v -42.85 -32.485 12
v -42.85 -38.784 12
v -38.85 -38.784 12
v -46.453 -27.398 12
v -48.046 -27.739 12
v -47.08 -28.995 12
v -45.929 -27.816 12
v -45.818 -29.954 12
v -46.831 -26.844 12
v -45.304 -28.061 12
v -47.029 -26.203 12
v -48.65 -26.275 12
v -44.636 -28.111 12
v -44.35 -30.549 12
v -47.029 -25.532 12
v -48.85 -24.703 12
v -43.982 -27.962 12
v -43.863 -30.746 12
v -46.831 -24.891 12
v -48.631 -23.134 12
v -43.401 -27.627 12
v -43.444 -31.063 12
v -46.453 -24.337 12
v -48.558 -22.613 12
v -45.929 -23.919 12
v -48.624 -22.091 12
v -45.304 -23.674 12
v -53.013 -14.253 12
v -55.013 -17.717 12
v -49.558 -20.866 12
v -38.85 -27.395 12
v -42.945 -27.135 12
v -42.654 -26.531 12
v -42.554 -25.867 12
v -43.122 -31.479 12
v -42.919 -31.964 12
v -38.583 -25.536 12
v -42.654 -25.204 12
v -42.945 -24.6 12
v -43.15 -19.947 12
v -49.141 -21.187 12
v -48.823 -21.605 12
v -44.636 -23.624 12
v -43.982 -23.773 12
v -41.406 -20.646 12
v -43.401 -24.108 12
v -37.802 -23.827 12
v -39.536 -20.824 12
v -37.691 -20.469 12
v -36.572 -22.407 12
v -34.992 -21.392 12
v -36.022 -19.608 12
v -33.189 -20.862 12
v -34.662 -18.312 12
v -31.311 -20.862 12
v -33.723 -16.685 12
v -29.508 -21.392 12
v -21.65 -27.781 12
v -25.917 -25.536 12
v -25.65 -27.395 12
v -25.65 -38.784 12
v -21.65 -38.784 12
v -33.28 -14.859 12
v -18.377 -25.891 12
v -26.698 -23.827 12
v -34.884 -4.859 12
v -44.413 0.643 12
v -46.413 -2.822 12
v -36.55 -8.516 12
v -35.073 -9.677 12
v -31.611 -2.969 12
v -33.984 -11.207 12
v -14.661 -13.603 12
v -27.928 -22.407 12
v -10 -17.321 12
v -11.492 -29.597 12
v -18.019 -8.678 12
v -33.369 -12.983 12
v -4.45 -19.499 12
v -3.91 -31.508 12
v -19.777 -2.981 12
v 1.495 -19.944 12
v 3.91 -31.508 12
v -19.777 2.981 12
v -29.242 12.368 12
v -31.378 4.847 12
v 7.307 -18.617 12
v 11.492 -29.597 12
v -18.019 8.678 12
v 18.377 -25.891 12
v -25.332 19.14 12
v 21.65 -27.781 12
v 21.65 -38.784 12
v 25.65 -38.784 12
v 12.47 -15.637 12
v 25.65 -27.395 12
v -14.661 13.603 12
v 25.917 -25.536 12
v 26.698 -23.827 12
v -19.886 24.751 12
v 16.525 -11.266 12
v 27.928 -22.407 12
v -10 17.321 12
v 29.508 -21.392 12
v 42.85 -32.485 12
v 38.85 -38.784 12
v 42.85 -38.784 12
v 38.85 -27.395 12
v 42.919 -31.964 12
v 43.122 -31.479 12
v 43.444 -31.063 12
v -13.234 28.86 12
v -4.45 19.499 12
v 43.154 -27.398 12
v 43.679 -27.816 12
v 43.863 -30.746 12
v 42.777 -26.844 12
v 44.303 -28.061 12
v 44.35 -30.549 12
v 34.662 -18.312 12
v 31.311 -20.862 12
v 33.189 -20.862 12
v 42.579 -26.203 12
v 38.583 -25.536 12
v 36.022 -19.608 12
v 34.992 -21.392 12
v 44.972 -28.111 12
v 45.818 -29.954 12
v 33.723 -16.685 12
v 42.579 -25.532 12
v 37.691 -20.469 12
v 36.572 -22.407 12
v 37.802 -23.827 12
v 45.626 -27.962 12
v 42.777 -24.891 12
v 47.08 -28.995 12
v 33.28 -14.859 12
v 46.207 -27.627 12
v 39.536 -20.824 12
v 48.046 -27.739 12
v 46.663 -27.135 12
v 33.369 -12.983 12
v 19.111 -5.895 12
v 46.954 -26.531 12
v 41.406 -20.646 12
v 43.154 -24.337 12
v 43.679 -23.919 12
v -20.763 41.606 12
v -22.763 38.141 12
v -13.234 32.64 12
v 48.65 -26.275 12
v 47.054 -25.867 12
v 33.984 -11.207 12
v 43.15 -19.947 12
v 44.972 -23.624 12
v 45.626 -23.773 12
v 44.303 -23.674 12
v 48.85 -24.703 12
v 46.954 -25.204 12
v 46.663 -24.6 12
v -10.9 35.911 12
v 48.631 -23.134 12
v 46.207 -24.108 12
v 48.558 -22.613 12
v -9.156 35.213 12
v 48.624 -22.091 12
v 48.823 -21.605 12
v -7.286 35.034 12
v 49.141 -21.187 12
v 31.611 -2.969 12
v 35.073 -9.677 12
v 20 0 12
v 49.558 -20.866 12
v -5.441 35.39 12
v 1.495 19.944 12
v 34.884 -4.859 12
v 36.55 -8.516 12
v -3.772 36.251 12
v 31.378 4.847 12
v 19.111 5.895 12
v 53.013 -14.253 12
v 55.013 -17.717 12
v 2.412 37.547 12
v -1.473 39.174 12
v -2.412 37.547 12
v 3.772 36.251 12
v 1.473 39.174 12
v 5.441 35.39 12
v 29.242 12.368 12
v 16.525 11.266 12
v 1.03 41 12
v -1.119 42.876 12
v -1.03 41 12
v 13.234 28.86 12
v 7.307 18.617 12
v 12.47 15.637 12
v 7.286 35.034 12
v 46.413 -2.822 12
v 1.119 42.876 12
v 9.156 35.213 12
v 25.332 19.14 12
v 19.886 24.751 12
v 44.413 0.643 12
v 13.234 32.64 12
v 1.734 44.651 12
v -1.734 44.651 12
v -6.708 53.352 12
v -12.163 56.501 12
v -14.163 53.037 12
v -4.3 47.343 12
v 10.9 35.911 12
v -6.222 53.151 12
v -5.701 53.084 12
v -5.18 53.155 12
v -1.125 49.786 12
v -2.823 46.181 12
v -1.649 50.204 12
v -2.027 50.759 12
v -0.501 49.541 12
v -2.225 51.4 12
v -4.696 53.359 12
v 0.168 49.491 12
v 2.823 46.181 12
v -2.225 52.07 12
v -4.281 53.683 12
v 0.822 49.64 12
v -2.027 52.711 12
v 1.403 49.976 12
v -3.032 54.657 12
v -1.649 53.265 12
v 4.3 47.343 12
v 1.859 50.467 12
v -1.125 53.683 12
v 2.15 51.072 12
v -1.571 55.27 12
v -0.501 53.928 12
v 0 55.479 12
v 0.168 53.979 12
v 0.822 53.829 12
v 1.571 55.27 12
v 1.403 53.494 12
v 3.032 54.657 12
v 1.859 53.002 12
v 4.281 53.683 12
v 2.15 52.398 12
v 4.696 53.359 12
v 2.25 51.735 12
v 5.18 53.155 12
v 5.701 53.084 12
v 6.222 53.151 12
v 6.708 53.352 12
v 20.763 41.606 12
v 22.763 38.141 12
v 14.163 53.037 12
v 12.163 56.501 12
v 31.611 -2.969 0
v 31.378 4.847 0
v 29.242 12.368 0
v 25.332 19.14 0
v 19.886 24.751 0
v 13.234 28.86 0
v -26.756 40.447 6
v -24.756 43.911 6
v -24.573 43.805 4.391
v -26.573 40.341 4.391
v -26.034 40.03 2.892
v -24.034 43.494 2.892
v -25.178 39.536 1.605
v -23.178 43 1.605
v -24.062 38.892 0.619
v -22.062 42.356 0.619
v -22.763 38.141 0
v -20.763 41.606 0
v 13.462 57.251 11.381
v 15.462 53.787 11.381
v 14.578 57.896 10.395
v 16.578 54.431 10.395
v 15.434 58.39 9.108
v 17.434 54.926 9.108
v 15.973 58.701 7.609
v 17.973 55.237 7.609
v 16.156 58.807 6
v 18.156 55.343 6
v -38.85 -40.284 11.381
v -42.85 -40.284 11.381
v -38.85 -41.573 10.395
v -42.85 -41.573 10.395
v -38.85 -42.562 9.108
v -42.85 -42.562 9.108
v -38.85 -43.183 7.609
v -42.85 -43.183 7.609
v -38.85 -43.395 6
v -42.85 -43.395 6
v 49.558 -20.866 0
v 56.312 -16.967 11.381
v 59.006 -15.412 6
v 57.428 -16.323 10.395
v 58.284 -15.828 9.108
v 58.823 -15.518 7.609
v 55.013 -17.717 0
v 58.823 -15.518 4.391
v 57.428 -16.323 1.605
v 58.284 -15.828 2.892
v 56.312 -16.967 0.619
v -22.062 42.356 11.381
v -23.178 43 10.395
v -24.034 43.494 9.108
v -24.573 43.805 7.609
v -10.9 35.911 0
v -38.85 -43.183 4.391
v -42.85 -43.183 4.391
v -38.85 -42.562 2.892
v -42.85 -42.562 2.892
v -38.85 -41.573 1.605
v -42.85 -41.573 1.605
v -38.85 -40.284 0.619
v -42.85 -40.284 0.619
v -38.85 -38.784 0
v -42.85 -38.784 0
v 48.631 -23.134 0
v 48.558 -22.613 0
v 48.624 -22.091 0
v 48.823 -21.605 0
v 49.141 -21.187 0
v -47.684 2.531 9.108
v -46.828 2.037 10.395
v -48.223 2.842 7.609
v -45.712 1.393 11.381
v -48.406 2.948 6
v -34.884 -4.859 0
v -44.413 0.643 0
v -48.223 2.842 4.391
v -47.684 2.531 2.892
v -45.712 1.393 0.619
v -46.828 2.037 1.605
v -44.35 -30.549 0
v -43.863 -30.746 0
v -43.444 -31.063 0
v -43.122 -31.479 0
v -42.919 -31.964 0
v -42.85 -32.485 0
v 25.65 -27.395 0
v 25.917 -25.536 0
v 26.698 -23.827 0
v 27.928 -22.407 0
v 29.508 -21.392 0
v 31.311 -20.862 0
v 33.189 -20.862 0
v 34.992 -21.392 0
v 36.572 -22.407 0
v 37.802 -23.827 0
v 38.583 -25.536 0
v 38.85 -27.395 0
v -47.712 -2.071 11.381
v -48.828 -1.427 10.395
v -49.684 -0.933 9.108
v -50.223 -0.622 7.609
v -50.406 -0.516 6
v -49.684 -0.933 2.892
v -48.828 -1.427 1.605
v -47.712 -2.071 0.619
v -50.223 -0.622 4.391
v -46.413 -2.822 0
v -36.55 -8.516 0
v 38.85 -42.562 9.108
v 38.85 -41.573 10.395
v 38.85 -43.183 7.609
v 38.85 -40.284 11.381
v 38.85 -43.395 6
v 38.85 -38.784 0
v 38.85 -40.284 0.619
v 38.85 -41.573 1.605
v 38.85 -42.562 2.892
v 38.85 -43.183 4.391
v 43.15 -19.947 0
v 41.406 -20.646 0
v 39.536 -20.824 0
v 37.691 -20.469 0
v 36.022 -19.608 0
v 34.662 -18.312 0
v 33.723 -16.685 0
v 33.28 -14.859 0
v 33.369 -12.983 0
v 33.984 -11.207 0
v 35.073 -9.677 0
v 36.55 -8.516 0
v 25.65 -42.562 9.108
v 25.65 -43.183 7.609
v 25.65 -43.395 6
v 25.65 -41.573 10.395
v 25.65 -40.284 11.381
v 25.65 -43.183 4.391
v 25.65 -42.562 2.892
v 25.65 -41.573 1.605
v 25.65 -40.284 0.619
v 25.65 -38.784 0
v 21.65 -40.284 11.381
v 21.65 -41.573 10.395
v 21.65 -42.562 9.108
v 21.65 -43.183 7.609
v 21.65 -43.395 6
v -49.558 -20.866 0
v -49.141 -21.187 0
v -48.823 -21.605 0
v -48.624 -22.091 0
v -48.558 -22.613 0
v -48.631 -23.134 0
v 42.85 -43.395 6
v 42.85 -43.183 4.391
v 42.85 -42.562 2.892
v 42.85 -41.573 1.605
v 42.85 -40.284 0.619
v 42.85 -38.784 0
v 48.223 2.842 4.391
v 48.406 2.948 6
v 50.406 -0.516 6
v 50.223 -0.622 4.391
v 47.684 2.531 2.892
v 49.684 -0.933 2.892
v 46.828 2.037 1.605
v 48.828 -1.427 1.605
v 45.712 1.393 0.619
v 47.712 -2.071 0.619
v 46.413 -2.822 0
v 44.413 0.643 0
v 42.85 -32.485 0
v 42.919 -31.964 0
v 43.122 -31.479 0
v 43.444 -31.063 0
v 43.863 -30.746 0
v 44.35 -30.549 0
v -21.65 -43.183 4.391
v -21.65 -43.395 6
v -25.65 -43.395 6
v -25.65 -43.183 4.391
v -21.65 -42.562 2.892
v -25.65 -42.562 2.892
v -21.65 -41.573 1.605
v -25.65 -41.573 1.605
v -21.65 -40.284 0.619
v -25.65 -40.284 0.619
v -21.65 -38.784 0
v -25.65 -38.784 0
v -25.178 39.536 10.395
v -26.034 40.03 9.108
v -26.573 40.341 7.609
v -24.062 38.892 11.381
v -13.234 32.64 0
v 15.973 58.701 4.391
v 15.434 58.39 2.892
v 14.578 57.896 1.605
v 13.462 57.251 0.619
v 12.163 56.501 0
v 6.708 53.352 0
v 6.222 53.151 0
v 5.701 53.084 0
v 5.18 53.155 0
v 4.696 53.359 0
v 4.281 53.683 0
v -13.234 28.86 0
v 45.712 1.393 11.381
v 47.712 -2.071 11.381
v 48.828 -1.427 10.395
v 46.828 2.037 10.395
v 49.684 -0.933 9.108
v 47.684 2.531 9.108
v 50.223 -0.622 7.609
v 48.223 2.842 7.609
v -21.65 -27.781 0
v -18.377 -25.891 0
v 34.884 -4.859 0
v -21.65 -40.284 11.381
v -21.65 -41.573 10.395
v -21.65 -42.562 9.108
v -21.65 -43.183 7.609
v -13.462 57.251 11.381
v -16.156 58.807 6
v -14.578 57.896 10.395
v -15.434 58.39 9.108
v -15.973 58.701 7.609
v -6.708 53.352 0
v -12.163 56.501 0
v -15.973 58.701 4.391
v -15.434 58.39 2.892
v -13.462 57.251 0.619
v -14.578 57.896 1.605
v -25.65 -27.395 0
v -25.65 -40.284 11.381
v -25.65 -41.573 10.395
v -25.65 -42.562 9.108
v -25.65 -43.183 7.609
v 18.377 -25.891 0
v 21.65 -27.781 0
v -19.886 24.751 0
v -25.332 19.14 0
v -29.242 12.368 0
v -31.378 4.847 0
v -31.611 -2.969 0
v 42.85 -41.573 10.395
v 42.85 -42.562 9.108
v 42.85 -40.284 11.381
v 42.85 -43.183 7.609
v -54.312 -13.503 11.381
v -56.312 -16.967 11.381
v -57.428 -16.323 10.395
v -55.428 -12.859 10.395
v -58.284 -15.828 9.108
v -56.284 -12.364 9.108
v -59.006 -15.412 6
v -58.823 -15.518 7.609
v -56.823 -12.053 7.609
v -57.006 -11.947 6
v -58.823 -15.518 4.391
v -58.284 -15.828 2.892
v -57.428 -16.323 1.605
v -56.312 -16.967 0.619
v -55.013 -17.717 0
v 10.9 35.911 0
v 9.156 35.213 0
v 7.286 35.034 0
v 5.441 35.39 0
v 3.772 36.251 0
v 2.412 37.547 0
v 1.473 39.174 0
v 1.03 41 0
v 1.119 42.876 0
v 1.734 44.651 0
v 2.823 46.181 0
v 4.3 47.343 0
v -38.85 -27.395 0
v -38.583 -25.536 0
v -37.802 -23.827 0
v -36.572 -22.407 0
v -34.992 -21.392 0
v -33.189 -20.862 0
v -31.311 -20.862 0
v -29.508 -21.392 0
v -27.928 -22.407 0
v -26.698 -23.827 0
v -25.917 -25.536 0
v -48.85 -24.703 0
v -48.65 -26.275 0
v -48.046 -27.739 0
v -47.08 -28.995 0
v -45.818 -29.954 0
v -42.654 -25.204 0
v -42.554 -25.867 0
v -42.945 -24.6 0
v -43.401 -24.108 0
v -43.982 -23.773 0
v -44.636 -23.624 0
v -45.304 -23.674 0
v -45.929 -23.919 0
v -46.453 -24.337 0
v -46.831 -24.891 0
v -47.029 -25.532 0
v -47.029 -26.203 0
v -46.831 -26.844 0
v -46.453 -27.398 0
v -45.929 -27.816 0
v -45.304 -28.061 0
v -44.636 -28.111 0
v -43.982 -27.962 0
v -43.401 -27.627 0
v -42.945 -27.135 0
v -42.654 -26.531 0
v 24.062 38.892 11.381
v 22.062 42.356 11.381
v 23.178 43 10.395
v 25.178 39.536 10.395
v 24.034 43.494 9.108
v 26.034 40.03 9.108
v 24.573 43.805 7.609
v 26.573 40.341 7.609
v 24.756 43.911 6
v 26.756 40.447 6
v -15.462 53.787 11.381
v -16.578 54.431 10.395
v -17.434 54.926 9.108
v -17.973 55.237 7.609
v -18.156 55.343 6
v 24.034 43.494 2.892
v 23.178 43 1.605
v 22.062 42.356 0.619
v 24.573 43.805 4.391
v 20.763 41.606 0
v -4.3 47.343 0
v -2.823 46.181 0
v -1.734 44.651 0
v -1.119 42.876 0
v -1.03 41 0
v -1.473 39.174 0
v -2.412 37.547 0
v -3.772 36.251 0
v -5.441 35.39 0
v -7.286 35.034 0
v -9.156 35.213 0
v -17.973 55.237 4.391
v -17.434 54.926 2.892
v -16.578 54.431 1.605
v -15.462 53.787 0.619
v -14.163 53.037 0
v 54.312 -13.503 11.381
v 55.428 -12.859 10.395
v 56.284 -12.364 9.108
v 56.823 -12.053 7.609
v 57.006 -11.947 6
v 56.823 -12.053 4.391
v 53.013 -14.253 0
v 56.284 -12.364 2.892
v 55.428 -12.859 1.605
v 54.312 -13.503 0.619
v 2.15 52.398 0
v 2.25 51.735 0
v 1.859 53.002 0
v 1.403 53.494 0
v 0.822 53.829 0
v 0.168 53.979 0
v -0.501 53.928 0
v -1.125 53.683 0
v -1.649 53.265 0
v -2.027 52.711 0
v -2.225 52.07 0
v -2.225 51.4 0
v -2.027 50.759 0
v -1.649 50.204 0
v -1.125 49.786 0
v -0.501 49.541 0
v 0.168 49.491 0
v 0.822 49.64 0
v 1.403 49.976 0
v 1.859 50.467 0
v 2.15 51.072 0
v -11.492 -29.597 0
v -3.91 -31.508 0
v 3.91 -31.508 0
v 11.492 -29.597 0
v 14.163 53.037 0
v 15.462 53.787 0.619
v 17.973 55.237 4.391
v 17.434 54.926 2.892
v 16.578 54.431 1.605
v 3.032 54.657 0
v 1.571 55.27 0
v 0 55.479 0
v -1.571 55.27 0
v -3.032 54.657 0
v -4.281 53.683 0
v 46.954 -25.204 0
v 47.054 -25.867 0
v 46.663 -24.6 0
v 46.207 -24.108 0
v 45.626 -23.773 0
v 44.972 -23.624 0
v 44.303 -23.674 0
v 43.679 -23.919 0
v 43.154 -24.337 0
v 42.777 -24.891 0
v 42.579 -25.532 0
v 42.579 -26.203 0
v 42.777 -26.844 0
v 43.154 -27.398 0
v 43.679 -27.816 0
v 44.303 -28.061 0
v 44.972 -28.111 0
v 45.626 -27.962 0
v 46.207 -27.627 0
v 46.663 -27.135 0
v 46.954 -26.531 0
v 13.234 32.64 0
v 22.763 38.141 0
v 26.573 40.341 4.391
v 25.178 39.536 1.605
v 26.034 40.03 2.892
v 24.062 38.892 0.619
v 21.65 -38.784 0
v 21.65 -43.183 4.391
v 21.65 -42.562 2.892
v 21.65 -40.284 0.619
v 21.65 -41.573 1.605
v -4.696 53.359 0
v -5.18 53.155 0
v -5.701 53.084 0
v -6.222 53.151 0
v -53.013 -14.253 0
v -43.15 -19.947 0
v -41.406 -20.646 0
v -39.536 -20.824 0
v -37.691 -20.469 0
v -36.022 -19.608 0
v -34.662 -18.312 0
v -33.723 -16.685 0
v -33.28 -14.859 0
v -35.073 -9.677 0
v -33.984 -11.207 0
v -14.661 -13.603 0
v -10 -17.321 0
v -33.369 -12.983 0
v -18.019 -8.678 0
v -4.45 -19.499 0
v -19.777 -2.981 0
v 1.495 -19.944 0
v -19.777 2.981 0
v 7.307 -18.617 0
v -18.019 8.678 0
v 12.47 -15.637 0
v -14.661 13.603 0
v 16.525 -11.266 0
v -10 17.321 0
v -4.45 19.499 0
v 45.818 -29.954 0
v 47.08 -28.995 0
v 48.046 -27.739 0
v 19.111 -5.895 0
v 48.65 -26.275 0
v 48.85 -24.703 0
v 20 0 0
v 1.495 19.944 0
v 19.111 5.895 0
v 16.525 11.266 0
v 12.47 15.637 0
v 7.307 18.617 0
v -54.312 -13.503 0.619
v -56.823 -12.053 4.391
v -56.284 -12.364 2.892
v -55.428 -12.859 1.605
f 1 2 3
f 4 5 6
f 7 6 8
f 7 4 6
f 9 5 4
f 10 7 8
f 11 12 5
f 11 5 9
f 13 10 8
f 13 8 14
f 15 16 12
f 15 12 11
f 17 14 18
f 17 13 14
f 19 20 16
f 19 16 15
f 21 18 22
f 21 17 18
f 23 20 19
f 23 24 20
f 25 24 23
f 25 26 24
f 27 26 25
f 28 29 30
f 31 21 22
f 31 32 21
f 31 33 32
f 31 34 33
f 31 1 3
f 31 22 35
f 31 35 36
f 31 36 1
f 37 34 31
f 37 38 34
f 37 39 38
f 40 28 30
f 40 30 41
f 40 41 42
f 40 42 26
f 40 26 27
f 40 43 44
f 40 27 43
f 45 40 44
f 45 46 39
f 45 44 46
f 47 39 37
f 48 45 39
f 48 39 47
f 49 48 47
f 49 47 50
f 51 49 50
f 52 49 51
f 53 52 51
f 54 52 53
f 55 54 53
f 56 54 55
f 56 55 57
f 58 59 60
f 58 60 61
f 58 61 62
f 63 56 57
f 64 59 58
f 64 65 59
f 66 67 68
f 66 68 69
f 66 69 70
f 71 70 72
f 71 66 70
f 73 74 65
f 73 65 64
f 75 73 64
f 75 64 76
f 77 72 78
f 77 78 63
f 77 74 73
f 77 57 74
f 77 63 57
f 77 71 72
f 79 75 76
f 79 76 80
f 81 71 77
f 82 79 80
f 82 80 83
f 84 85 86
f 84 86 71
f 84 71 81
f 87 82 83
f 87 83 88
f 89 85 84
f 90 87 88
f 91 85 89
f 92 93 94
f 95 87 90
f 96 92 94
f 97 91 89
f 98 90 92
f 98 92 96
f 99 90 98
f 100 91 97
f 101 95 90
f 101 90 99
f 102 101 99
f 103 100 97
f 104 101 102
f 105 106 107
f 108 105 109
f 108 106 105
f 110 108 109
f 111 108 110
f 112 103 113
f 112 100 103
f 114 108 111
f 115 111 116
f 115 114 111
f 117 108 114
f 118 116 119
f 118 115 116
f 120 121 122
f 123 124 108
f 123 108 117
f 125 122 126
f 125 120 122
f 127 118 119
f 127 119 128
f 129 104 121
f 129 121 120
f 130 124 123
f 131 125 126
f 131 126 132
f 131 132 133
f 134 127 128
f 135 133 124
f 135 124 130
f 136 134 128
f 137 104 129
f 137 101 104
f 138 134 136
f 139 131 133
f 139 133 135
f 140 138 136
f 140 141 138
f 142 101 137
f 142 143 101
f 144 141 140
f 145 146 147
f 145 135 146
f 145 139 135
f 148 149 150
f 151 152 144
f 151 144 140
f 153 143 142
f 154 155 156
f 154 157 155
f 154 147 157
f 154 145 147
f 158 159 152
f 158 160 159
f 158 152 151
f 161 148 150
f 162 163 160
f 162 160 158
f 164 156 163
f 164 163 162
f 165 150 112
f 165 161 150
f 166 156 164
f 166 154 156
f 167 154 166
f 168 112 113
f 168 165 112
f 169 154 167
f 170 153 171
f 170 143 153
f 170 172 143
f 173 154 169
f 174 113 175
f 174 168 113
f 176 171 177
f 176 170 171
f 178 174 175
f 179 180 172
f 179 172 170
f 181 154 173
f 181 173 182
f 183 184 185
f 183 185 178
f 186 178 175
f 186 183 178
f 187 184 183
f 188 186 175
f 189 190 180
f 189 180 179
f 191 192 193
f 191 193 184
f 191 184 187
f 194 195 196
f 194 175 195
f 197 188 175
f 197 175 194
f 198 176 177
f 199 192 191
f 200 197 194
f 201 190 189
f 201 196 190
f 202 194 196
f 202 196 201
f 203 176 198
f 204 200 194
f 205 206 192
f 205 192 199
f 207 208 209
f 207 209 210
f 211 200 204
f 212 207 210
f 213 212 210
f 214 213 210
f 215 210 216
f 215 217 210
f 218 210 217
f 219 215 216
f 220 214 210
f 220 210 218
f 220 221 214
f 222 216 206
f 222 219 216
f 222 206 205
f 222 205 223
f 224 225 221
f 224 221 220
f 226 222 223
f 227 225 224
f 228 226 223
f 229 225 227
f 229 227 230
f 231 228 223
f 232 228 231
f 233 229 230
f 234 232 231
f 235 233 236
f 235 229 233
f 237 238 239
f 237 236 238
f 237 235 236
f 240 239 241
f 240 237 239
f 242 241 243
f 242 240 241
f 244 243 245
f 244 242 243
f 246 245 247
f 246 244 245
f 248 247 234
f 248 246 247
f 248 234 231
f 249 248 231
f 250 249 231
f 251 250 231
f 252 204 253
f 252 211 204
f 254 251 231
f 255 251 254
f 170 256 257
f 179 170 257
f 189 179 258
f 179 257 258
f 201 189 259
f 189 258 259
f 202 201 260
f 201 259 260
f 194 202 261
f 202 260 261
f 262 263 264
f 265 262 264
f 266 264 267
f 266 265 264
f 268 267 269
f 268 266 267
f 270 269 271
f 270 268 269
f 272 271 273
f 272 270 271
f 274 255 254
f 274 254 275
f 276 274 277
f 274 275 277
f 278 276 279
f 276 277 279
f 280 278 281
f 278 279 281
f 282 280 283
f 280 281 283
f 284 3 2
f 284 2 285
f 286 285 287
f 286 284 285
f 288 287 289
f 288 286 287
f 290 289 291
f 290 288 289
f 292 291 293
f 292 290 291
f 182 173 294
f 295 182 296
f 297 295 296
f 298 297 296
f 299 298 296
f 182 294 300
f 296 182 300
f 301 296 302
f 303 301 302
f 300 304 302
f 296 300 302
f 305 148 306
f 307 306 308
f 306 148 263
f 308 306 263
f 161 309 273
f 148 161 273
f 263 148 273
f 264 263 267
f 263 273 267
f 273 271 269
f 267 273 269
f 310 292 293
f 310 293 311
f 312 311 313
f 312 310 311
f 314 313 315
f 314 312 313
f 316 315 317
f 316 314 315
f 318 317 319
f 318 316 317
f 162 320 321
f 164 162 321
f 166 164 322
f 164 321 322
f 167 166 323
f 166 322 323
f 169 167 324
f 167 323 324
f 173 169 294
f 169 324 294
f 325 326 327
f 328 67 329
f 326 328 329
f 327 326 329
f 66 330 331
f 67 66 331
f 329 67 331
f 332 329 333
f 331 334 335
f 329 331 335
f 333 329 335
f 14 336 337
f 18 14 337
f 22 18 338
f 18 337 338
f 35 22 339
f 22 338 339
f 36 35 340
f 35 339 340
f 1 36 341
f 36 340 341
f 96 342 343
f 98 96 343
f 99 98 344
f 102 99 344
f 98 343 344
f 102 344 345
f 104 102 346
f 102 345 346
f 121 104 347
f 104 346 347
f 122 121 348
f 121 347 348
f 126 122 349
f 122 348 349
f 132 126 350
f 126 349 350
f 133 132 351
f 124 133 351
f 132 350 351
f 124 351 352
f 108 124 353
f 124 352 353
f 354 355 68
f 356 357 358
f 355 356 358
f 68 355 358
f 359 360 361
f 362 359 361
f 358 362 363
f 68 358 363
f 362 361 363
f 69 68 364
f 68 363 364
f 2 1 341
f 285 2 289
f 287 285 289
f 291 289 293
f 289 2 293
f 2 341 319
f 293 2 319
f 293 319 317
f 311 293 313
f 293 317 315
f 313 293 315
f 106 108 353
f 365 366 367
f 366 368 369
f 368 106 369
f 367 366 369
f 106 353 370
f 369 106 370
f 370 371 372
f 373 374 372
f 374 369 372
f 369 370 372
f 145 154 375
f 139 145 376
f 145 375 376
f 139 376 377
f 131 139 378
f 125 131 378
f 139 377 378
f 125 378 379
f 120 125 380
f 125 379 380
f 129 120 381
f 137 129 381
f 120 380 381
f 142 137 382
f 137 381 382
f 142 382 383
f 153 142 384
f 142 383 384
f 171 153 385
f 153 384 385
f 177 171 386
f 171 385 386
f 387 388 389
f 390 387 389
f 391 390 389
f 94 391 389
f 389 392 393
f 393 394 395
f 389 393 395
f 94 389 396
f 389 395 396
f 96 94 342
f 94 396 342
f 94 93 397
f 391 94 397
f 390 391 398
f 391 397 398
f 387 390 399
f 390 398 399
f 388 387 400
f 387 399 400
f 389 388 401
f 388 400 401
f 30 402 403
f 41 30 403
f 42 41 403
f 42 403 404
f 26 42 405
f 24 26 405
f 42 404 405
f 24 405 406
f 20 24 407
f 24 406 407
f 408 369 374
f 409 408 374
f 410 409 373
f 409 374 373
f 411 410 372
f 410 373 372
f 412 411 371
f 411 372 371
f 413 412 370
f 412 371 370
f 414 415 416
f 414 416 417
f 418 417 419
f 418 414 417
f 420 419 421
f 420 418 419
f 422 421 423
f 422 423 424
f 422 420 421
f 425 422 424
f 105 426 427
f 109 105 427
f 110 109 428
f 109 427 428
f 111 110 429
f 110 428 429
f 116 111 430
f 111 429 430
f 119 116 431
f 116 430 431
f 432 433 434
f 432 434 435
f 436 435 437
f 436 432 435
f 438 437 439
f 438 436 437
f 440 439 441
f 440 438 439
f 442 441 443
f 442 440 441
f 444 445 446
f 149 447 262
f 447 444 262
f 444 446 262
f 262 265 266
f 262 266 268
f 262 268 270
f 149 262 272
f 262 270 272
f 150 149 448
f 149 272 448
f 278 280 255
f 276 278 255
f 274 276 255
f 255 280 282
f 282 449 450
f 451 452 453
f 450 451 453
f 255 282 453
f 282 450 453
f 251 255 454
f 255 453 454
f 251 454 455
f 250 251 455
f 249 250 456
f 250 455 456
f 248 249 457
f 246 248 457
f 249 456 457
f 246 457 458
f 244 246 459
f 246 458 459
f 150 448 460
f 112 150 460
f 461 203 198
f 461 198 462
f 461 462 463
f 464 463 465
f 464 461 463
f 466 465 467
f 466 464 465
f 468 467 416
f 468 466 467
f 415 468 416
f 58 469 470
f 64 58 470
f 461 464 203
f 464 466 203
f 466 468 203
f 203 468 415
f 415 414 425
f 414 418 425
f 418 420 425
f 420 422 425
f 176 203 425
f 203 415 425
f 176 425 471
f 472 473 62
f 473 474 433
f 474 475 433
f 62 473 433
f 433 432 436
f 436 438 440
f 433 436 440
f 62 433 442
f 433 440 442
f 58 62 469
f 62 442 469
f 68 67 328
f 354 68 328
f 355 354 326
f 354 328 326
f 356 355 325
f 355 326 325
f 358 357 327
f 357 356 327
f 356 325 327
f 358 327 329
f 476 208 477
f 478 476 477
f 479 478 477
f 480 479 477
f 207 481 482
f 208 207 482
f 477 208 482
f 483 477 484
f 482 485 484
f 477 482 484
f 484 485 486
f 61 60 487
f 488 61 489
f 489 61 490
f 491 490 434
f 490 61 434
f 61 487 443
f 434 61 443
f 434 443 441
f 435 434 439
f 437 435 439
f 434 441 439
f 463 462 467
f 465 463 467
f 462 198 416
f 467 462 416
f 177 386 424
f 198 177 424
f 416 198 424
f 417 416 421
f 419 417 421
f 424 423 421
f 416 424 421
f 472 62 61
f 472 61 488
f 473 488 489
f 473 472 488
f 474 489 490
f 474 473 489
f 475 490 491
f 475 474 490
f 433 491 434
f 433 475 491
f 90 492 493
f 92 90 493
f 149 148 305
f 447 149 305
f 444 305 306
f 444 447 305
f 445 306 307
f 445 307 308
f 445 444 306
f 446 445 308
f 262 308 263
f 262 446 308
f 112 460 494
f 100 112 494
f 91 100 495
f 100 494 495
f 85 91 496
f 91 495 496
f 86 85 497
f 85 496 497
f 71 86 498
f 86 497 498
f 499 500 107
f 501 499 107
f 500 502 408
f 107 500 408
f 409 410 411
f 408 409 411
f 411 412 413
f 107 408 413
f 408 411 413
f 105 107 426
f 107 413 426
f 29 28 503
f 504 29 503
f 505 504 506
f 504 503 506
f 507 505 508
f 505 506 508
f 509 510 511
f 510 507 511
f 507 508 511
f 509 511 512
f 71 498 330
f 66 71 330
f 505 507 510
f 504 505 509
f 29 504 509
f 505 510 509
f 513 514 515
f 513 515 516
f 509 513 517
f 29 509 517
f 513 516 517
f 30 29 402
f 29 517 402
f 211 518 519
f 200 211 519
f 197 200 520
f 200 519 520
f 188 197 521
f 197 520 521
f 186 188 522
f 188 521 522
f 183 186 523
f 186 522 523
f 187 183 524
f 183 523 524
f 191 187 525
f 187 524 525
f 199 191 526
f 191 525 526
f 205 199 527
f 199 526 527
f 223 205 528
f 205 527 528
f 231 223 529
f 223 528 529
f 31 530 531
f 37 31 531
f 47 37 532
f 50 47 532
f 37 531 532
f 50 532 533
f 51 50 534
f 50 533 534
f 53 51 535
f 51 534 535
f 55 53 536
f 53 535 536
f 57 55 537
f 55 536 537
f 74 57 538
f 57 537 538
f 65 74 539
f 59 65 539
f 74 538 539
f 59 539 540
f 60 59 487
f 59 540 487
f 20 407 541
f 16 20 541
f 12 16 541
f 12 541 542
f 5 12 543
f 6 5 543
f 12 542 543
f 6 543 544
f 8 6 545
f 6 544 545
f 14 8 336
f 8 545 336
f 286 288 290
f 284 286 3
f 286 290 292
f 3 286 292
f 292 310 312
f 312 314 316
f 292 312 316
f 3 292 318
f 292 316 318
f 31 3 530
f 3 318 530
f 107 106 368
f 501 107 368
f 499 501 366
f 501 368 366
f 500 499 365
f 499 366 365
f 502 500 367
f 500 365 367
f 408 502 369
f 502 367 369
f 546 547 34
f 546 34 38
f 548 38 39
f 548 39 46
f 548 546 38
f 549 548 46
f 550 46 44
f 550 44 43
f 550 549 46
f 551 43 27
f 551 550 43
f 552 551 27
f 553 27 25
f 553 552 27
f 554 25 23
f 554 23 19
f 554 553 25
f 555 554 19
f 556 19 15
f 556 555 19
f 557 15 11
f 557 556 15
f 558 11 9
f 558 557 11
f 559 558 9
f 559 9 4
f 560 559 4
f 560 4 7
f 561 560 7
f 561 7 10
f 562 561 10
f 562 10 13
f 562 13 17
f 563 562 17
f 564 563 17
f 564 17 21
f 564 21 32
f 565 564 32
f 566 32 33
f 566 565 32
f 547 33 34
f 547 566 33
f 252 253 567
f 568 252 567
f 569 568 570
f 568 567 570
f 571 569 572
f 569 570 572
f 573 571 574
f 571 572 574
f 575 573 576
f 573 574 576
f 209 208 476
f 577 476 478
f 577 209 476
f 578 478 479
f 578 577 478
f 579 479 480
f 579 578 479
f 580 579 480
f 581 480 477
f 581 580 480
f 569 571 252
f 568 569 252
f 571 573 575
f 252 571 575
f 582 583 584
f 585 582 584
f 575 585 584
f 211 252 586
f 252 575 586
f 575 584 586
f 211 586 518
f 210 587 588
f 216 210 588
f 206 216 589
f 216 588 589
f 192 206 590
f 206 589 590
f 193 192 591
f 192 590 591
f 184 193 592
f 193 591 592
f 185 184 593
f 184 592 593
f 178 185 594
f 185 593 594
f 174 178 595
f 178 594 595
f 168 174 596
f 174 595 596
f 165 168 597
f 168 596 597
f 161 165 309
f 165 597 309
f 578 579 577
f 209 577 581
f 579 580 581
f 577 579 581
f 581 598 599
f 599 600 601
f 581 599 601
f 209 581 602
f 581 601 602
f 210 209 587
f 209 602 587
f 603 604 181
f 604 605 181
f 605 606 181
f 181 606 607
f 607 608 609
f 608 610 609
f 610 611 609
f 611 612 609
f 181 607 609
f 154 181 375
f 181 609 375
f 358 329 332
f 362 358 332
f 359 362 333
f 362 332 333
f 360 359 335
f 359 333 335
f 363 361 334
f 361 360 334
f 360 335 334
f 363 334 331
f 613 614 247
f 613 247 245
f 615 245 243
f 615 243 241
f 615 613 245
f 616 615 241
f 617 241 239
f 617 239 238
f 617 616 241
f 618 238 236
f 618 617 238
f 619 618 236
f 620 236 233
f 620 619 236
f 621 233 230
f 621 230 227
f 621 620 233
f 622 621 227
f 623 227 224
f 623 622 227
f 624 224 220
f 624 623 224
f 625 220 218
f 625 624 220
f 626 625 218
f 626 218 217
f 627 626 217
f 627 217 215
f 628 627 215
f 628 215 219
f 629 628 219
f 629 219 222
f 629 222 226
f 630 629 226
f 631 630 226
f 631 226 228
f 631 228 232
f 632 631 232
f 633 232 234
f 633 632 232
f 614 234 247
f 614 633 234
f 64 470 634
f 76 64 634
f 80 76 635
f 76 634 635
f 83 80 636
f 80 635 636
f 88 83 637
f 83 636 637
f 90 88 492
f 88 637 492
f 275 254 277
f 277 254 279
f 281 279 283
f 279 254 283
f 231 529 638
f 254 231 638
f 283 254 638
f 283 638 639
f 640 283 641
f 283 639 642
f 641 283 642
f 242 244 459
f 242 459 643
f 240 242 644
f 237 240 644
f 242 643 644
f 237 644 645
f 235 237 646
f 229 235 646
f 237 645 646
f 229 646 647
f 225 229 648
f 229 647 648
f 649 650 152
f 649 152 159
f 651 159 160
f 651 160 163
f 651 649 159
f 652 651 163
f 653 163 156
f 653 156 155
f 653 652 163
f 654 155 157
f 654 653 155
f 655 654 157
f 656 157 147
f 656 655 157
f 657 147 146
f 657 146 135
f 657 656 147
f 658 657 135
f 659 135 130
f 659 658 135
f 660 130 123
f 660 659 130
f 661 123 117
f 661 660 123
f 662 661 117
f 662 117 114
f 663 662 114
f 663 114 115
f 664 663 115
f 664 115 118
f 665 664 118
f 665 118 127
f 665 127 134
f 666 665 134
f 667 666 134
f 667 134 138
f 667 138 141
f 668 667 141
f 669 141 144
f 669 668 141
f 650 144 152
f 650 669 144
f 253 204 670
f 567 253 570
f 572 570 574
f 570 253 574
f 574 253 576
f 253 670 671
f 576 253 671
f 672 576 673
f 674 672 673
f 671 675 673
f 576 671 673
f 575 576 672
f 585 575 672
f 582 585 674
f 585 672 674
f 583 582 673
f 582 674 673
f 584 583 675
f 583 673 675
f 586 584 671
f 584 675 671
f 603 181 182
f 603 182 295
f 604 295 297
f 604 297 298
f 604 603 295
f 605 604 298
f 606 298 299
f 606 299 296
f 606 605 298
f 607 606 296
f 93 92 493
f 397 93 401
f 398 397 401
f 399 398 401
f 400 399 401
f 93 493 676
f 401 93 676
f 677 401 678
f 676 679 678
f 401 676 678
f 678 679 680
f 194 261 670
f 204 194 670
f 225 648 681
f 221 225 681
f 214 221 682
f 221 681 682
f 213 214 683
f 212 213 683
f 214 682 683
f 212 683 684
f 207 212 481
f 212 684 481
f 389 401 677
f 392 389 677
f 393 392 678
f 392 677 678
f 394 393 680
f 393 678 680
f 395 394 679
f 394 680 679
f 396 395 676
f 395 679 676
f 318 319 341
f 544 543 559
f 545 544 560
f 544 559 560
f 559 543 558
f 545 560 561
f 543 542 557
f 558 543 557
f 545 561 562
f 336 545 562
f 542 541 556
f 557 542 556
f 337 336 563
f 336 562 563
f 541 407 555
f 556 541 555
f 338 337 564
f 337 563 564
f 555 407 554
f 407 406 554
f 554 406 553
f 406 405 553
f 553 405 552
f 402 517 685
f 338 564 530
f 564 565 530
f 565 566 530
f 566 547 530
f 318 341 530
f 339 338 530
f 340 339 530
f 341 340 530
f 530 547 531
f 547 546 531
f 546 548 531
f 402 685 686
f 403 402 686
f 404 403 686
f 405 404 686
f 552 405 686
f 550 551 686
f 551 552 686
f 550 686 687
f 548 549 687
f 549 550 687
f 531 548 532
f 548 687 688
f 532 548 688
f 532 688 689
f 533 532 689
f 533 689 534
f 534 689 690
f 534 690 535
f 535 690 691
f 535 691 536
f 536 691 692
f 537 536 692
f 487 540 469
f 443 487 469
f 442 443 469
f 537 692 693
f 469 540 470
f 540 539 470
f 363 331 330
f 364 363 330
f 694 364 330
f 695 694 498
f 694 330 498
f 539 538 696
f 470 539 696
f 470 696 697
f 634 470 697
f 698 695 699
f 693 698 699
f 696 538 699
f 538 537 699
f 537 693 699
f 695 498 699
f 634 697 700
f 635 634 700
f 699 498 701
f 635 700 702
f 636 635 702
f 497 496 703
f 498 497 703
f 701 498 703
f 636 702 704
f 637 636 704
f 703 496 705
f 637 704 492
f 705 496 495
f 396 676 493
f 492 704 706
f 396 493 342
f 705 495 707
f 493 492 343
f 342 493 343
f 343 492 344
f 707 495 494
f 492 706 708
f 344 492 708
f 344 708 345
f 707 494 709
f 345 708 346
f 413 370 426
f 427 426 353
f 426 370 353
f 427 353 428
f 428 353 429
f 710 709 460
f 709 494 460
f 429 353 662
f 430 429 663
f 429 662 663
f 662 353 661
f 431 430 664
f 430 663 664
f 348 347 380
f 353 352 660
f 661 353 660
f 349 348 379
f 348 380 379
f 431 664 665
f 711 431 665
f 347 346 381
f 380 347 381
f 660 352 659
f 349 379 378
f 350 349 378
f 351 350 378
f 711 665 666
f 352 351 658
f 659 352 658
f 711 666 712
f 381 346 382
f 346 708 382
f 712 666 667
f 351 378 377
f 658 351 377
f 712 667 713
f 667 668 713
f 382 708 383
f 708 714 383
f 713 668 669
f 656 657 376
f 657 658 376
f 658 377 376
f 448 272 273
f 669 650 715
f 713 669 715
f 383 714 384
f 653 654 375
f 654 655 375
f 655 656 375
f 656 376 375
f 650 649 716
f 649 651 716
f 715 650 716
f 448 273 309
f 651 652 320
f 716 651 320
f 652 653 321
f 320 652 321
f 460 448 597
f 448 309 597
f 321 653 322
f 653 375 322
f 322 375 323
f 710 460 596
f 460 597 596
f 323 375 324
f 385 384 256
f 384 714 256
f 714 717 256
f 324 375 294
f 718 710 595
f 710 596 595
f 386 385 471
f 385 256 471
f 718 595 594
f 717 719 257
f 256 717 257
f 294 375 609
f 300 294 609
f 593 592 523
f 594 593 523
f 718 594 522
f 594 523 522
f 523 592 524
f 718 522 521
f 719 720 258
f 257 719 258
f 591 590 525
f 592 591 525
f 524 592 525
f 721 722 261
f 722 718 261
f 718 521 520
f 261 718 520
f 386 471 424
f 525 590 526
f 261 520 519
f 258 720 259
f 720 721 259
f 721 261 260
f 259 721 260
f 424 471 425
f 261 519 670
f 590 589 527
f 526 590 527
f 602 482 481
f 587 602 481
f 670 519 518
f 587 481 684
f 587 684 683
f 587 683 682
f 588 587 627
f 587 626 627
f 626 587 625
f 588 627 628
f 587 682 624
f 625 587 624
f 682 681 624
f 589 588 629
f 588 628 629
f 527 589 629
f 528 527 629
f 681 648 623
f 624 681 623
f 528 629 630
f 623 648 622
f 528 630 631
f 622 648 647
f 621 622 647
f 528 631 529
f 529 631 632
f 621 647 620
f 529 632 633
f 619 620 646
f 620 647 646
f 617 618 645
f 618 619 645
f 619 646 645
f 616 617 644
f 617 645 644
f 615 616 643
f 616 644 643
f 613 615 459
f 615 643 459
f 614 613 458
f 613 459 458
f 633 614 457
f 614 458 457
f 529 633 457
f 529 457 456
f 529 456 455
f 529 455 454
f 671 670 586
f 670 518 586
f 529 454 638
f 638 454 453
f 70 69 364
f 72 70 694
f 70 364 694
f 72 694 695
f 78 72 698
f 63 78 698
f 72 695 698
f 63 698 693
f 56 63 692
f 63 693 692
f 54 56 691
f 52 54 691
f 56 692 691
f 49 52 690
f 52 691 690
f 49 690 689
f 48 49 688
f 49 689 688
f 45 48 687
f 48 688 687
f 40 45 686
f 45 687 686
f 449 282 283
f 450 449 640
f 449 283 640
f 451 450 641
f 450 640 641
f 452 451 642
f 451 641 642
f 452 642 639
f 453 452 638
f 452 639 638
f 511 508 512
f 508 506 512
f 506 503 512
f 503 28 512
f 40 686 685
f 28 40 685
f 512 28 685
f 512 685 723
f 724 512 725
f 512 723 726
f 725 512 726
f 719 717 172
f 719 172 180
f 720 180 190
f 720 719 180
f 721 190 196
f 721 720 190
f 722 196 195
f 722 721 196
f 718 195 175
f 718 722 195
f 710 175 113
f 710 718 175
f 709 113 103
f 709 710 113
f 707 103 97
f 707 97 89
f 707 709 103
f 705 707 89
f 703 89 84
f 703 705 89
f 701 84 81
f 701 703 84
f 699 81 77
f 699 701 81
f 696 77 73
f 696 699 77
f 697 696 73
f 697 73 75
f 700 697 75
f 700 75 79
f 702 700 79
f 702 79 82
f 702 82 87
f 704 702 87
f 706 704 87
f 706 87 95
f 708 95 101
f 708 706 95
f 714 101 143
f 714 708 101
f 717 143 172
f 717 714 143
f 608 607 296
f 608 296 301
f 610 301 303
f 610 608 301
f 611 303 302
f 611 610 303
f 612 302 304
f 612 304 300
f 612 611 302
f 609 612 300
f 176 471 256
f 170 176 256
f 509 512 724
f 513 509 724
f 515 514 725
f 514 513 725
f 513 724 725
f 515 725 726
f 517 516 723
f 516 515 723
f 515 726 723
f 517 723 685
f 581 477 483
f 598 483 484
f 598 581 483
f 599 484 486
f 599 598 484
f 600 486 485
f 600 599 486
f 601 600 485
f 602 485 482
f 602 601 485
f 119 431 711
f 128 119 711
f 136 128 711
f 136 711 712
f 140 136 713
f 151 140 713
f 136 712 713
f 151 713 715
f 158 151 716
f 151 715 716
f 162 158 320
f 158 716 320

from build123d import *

# Parameters (mm, degrees)
F0_R          = 2.25
F0_R_2        = 20
F1_DEPTH      = 12
F5_DEPTH      = 25
F5_DEPTH_BACK = 68
F6_DEPTH      = 25
F6_DEPTH_BACK = 68
F7_DEPTH      = 25
F7_DEPTH_BACK = 68


with BuildPart() as f1:
    # F0 (on Top) → F1 (new body)
    with BuildSketch(Plane.XY):
        with BuildLine():
            Line((-13.2341793977, 32.6400236937), (-13.2341793977, 28.8603360284))
            ThreePointArc((-13.2341793977, 28.8603360284), (-27.4963065702, 15.875), (-31.6108738612, -2.9690324575))
            Line((-31.6108738612, -2.9690324575), (-34.8841793977, -4.8588762902))
            Line((-34.8841793977, -4.8588762902), (-48.4064064606, 2.9481851446))
            Line((-48.4064064606, 2.9481851446), (-50.4064064606, -0.5159164705))
            Line((-50.4064064606, -0.5159164705), (-36.55, -8.5159164705))
            ThreePointArc((-36.55, -8.5159164705), (-34.134232335, -17.5316841355), (-43.15, -19.9474518005))
            Line((-43.15, -19.9474518005), (-57.0064064606, -11.9474518005))
            Line((-57.0064064606, -11.9474518005), (-59.0064064606, -15.4115534156))
            Line((-59.0064064606, -15.4115534156), (-49.5582039325, -20.8664756886))
            ThreePointArc((-49.5582039325, -20.8664756886), (-48.7069743457, -21.8415925381), (-48.6311529494, -23.1337596308))
            ThreePointArc((-48.6311529494, -23.1337596308), (-48.0461524227, -27.7394590348), (-44.35, -30.5489340541))
            ThreePointArc((-44.35, -30.5489340541), (-43.2688611699, -31.2606808558), (-42.85, -32.4854257272))
            Line((-42.85, -32.4854257272), (-42.85, -43.395270273))
            Line((-42.85, -43.395270273), (-38.85, -43.395270273))
            Line((-38.85, -43.395270273), (-38.85, -27.395270273))
            ThreePointArc((-38.85, -27.395270273), (-32.25, -20.795270273), (-25.65, -27.395270273))
            Line((-25.65, -27.395270273), (-25.65, -43.395270273))
            Line((-25.65, -43.395270273), (-21.65, -43.395270273))
            Line((-21.65, -43.395270273), (-21.65, -27.7811474035))
            Line((-21.65, -27.7811474035), (-18.3766944635, -25.8913035708))
            ThreePointArc((-18.3766944635, -25.8913035708), (0, -31.75), (18.3766944635, -25.8913035708))
            Line((18.3766944635, -25.8913035708), (21.65, -27.7811474035))
            Line((21.65, -27.7811474035), (21.65, -43.395270273))
            Line((21.65, -43.395270273), (25.65, -43.395270273))
            Line((25.65, -43.395270273), (25.65, -27.395270273))
            ThreePointArc((25.65, -27.395270273), (32.25, -20.795270273), (38.85, -27.395270273))
            Line((38.85, -27.395270273), (38.85, -43.395270273))
            Line((38.85, -43.395270273), (42.85, -43.395270273))
            Line((42.85, -43.395270273), (42.85, -32.4854257272))
            ThreePointArc((42.85, -32.4854257272), (43.2688611699, -31.2606808558), (44.35, -30.5489340541))
            ThreePointArc((44.35, -30.5489340541), (48.0461524227, -27.7394590348), (48.6311529494, -23.1337596308))
            ThreePointArc((48.6311529494, -23.1337596308), (48.7069743457, -21.8415925381), (49.5582039325, -20.8664756886))
            Line((49.5582039325, -20.8664756886), (59.0064064606, -15.4115534156))
            Line((59.0064064606, -15.4115534156), (57.0064064606, -11.9474518005))
            Line((57.0064064606, -11.9474518005), (43.15, -19.9474518005))
            ThreePointArc((43.15, -19.9474518005), (34.134232335, -17.5316841355), (36.55, -8.5159164705))
            Line((36.55, -8.5159164705), (50.4064064606, -0.5159164705))
            Line((50.4064064606, -0.5159164705), (48.4064064606, 2.9481851446))
            Line((48.4064064606, 2.9481851446), (34.8841793977, -4.8588762902))
            Line((34.8841793977, -4.8588762902), (31.6108738612, -2.9690324575))
            ThreePointArc((31.6108738612, -2.9690324575), (27.4963065702, 15.875), (13.2341793977, 28.8603360284))
            Line((13.2341793977, 28.8603360284), (13.2341793977, 32.6400236937))
            Line((13.2341793977, 32.6400236937), (26.7564064606, 40.4470851285))
            Line((26.7564064606, 40.4470851285), (24.7564064606, 43.9111867436))
            Line((24.7564064606, 43.9111867436), (10.9, 35.9111867436))
            ThreePointArc((10.9, 35.9111867436), (1.884232335, 38.3269544086), (4.3, 47.3427220735))
            Line((4.3, 47.3427220735), (18.1564064606, 55.3427220735))
            Line((18.1564064606, 55.3427220735), (16.1564064606, 58.8068236887))
            Line((16.1564064606, 58.8068236887), (6.7082039325, 53.3519014158))
            ThreePointArc((6.7082039325, 53.3519014158), (5.4381131758, 53.1022733939), (4.2811529494, 53.6826936849))
            ThreePointArc((4.2811529494, 53.6826936849), (0, 55.4789180696), (-4.2811529494, 53.6826936849))
            ThreePointArc((-4.2811529494, 53.6826936849), (-5.4381131758, 53.1022733939), (-6.7082039325, 53.3519014158))
            Line((-6.7082039325, 53.3519014158), (-16.1564064606, 58.8068236887))
            Line((-16.1564064606, 58.8068236887), (-18.1564064606, 55.3427220735))
            Line((-18.1564064606, 55.3427220735), (-4.3, 47.3427220735))
            ThreePointArc((-4.3, 47.3427220735), (-1.884232335, 38.3269544086), (-10.9, 35.9111867436))
            Line((-10.9, 35.9111867436), (-24.7564064606, 43.9111867436))
            Line((-24.7564064606, 43.9111867436), (-26.7564064606, 40.4470851285))
            Line((-26.7564064606, 40.4470851285), (-13.2341793977, 32.6400236937))
        make_face()
        with Locations((-44.8037193958, -25.8674394539)):
            Circle(F0_R, mode=Mode.SUBTRACT)
        with Locations((44.8037193958, -25.8674394539)):
            Circle(F0_R, mode=Mode.SUBTRACT)
        Circle(F0_R_2, mode=Mode.SUBTRACT)
        with Locations((0, 51.7348789078)):
            Circle(F0_R, mode=Mode.SUBTRACT)
    extrude(amount=F1_DEPTH)

    # F2 (on face) → F5 (cut, two sides)
    with BuildSketch(Plane(origin=(21.65, 0, 0), x_dir=(0, -1, 0), z_dir=(-1, 0, 0))) as f5_sk:
        with BuildLine():
            ThreePointArc((38.7840602421, 12), (42.1092993822, 9.7836245172), (43.395270273, 6))
            Line((43.395270273, 6), (43.395270273, 12))
            Line((43.395270273, 12), (38.7840602421, 12))
        make_face()
        with BuildLine():
            ThreePointArc((38.7840602421, 0), (38.0044089294, -0.1549812), (37.2113464037, -0.2090845469))
            Line((37.2113464037, -0.2090845469), (37.2113464037, -2.7538968716))
            Line((37.2113464037, -2.7538968716), (50.0447638333, -2.7538968716))
            Line((50.0447638333, -2.7538968716), (50.0447638333, 14.7538968716))
            Line((50.0447638333, 14.7538968716), (37.2113464037, 14.7538968716))
            Line((37.2113464037, 14.7538968716), (37.2113464037, 12.2090845469))
            ThreePointArc((37.2113464037, 12.2090845469), (38.0044089294, 12.1549812), (38.7840602421, 12))
            Line((38.7840602421, 12), (43.395270273, 12))
            Line((43.395270273, 12), (43.395270273, 6))
            Line((43.395270273, 6), (43.395270273, 0))
            Line((43.395270273, 0), (38.7840602421, 0))
        make_face()
        with BuildLine():
            ThreePointArc((43.395270273, 6), (42.1092993822, 2.2163754828), (38.7840602421, 0))
            Line((38.7840602421, 0), (43.395270273, 0))
            Line((43.395270273, 0), (43.395270273, 6))
        make_face()
    extrude(amount=-F5_DEPTH, mode=Mode.SUBTRACT)
    extrude(f5_sk.sketch, amount=F5_DEPTH_BACK, mode=Mode.SUBTRACT)

    # F3 (on face) → F6 (cut, two sides)
    with BuildSketch(Plane(origin=(-10.825, 18.7494499919, 0), x_dir=(0.8660254038, 0.5, 0), z_dir=(0.5, -0.8660254038, 0))) as f6_sk:
        with BuildLine():
            ThreePointArc((38.7840602421, 0), (38.0044089294, -0.1549812), (37.2113464037, -0.2090845469))
            Line((37.2113464037, -0.2090845469), (37.2113464037, -2.7538968716))
            Line((37.2113464037, -2.7538968716), (50.0447638333, -2.7538968716))
            Line((50.0447638333, -2.7538968716), (50.0447638333, 14.7538968716))
            Line((50.0447638333, 14.7538968716), (37.2113464037, 14.7538968716))
            Line((37.2113464037, 14.7538968716), (37.2113464037, 12.2090845469))
            ThreePointArc((37.2113464037, 12.2090845469), (38.0044089294, 12.1549812), (38.7840602421, 12))
            Line((38.7840602421, 12), (43.395270273, 12))
            Line((43.395270273, 12), (43.395270273, 6))
            Line((43.395270273, 6), (43.395270273, 0))
            Line((43.395270273, 0), (38.7840602421, 0))
        make_face()
        with BuildLine():
            ThreePointArc((38.7840602421, 12), (42.1092993822, 9.7836245172), (43.395270273, 6))
            Line((43.395270273, 6), (43.395270273, 12))
            Line((43.395270273, 12), (38.7840602421, 12))
        make_face()
        with BuildLine():
            ThreePointArc((43.395270273, 6), (42.1092993822, 2.2163754828), (38.7840602421, 0))
            Line((38.7840602421, 0), (43.395270273, 0))
            Line((43.395270273, 0), (43.395270273, 6))
        make_face()
    extrude(amount=-F6_DEPTH, mode=Mode.SUBTRACT)
    extrude(f6_sk.sketch, amount=F6_DEPTH_BACK, mode=Mode.SUBTRACT)

    # F4 (on face) → F7 (cut, two sides)
    with BuildSketch(Plane(origin=(-10.825, -18.7494499919, 0), x_dir=(-0.8660254038, 0.5, 0), z_dir=(0.5, 0.8660254038, 0))) as f7_sk:
        with BuildLine():
            ThreePointArc((38.7840602421, 0), (38.0044089294, -0.1549812), (37.2113464037, -0.2090845469))
            Line((37.2113464037, -0.2090845469), (37.2113464037, -2.7538968716))
            Line((37.2113464037, -2.7538968716), (50.0447638333, -2.7538968716))
            Line((50.0447638333, -2.7538968716), (50.0447638333, 14.7538968716))
            Line((50.0447638333, 14.7538968716), (37.2113464037, 14.7538968716))
            Line((37.2113464037, 14.7538968716), (37.2113464037, 12.2090845469))
            ThreePointArc((37.2113464037, 12.2090845469), (38.0044089294, 12.1549812), (38.7840602421, 12))
            Line((38.7840602421, 12), (43.395270273, 12))
            Line((43.395270273, 12), (43.395270273, 6))
            Line((43.395270273, 6), (43.395270273, 0))
            Line((43.395270273, 0), (38.7840602421, 0))
        make_face()
        with BuildLine():
            ThreePointArc((43.395270273, 6), (42.1092993822, 2.2163754828), (38.7840602421, 0))
            Line((38.7840602421, 0), (43.395270273, 0))
            Line((43.395270273, 0), (43.395270273, 6))
        make_face()
        with BuildLine():
            ThreePointArc((38.7840602421, 12), (42.1092993822, 9.7836245172), (43.395270273, 6))
            Line((43.395270273, 6), (43.395270273, 12))
            Line((43.395270273, 12), (38.7840602421, 12))
        make_face()
    extrude(amount=-F7_DEPTH, mode=Mode.SUBTRACT)
    extrude(f7_sk.sketch, amount=F7_DEPTH_BACK, mode=Mode.SUBTRACT)


solid = f1.part
